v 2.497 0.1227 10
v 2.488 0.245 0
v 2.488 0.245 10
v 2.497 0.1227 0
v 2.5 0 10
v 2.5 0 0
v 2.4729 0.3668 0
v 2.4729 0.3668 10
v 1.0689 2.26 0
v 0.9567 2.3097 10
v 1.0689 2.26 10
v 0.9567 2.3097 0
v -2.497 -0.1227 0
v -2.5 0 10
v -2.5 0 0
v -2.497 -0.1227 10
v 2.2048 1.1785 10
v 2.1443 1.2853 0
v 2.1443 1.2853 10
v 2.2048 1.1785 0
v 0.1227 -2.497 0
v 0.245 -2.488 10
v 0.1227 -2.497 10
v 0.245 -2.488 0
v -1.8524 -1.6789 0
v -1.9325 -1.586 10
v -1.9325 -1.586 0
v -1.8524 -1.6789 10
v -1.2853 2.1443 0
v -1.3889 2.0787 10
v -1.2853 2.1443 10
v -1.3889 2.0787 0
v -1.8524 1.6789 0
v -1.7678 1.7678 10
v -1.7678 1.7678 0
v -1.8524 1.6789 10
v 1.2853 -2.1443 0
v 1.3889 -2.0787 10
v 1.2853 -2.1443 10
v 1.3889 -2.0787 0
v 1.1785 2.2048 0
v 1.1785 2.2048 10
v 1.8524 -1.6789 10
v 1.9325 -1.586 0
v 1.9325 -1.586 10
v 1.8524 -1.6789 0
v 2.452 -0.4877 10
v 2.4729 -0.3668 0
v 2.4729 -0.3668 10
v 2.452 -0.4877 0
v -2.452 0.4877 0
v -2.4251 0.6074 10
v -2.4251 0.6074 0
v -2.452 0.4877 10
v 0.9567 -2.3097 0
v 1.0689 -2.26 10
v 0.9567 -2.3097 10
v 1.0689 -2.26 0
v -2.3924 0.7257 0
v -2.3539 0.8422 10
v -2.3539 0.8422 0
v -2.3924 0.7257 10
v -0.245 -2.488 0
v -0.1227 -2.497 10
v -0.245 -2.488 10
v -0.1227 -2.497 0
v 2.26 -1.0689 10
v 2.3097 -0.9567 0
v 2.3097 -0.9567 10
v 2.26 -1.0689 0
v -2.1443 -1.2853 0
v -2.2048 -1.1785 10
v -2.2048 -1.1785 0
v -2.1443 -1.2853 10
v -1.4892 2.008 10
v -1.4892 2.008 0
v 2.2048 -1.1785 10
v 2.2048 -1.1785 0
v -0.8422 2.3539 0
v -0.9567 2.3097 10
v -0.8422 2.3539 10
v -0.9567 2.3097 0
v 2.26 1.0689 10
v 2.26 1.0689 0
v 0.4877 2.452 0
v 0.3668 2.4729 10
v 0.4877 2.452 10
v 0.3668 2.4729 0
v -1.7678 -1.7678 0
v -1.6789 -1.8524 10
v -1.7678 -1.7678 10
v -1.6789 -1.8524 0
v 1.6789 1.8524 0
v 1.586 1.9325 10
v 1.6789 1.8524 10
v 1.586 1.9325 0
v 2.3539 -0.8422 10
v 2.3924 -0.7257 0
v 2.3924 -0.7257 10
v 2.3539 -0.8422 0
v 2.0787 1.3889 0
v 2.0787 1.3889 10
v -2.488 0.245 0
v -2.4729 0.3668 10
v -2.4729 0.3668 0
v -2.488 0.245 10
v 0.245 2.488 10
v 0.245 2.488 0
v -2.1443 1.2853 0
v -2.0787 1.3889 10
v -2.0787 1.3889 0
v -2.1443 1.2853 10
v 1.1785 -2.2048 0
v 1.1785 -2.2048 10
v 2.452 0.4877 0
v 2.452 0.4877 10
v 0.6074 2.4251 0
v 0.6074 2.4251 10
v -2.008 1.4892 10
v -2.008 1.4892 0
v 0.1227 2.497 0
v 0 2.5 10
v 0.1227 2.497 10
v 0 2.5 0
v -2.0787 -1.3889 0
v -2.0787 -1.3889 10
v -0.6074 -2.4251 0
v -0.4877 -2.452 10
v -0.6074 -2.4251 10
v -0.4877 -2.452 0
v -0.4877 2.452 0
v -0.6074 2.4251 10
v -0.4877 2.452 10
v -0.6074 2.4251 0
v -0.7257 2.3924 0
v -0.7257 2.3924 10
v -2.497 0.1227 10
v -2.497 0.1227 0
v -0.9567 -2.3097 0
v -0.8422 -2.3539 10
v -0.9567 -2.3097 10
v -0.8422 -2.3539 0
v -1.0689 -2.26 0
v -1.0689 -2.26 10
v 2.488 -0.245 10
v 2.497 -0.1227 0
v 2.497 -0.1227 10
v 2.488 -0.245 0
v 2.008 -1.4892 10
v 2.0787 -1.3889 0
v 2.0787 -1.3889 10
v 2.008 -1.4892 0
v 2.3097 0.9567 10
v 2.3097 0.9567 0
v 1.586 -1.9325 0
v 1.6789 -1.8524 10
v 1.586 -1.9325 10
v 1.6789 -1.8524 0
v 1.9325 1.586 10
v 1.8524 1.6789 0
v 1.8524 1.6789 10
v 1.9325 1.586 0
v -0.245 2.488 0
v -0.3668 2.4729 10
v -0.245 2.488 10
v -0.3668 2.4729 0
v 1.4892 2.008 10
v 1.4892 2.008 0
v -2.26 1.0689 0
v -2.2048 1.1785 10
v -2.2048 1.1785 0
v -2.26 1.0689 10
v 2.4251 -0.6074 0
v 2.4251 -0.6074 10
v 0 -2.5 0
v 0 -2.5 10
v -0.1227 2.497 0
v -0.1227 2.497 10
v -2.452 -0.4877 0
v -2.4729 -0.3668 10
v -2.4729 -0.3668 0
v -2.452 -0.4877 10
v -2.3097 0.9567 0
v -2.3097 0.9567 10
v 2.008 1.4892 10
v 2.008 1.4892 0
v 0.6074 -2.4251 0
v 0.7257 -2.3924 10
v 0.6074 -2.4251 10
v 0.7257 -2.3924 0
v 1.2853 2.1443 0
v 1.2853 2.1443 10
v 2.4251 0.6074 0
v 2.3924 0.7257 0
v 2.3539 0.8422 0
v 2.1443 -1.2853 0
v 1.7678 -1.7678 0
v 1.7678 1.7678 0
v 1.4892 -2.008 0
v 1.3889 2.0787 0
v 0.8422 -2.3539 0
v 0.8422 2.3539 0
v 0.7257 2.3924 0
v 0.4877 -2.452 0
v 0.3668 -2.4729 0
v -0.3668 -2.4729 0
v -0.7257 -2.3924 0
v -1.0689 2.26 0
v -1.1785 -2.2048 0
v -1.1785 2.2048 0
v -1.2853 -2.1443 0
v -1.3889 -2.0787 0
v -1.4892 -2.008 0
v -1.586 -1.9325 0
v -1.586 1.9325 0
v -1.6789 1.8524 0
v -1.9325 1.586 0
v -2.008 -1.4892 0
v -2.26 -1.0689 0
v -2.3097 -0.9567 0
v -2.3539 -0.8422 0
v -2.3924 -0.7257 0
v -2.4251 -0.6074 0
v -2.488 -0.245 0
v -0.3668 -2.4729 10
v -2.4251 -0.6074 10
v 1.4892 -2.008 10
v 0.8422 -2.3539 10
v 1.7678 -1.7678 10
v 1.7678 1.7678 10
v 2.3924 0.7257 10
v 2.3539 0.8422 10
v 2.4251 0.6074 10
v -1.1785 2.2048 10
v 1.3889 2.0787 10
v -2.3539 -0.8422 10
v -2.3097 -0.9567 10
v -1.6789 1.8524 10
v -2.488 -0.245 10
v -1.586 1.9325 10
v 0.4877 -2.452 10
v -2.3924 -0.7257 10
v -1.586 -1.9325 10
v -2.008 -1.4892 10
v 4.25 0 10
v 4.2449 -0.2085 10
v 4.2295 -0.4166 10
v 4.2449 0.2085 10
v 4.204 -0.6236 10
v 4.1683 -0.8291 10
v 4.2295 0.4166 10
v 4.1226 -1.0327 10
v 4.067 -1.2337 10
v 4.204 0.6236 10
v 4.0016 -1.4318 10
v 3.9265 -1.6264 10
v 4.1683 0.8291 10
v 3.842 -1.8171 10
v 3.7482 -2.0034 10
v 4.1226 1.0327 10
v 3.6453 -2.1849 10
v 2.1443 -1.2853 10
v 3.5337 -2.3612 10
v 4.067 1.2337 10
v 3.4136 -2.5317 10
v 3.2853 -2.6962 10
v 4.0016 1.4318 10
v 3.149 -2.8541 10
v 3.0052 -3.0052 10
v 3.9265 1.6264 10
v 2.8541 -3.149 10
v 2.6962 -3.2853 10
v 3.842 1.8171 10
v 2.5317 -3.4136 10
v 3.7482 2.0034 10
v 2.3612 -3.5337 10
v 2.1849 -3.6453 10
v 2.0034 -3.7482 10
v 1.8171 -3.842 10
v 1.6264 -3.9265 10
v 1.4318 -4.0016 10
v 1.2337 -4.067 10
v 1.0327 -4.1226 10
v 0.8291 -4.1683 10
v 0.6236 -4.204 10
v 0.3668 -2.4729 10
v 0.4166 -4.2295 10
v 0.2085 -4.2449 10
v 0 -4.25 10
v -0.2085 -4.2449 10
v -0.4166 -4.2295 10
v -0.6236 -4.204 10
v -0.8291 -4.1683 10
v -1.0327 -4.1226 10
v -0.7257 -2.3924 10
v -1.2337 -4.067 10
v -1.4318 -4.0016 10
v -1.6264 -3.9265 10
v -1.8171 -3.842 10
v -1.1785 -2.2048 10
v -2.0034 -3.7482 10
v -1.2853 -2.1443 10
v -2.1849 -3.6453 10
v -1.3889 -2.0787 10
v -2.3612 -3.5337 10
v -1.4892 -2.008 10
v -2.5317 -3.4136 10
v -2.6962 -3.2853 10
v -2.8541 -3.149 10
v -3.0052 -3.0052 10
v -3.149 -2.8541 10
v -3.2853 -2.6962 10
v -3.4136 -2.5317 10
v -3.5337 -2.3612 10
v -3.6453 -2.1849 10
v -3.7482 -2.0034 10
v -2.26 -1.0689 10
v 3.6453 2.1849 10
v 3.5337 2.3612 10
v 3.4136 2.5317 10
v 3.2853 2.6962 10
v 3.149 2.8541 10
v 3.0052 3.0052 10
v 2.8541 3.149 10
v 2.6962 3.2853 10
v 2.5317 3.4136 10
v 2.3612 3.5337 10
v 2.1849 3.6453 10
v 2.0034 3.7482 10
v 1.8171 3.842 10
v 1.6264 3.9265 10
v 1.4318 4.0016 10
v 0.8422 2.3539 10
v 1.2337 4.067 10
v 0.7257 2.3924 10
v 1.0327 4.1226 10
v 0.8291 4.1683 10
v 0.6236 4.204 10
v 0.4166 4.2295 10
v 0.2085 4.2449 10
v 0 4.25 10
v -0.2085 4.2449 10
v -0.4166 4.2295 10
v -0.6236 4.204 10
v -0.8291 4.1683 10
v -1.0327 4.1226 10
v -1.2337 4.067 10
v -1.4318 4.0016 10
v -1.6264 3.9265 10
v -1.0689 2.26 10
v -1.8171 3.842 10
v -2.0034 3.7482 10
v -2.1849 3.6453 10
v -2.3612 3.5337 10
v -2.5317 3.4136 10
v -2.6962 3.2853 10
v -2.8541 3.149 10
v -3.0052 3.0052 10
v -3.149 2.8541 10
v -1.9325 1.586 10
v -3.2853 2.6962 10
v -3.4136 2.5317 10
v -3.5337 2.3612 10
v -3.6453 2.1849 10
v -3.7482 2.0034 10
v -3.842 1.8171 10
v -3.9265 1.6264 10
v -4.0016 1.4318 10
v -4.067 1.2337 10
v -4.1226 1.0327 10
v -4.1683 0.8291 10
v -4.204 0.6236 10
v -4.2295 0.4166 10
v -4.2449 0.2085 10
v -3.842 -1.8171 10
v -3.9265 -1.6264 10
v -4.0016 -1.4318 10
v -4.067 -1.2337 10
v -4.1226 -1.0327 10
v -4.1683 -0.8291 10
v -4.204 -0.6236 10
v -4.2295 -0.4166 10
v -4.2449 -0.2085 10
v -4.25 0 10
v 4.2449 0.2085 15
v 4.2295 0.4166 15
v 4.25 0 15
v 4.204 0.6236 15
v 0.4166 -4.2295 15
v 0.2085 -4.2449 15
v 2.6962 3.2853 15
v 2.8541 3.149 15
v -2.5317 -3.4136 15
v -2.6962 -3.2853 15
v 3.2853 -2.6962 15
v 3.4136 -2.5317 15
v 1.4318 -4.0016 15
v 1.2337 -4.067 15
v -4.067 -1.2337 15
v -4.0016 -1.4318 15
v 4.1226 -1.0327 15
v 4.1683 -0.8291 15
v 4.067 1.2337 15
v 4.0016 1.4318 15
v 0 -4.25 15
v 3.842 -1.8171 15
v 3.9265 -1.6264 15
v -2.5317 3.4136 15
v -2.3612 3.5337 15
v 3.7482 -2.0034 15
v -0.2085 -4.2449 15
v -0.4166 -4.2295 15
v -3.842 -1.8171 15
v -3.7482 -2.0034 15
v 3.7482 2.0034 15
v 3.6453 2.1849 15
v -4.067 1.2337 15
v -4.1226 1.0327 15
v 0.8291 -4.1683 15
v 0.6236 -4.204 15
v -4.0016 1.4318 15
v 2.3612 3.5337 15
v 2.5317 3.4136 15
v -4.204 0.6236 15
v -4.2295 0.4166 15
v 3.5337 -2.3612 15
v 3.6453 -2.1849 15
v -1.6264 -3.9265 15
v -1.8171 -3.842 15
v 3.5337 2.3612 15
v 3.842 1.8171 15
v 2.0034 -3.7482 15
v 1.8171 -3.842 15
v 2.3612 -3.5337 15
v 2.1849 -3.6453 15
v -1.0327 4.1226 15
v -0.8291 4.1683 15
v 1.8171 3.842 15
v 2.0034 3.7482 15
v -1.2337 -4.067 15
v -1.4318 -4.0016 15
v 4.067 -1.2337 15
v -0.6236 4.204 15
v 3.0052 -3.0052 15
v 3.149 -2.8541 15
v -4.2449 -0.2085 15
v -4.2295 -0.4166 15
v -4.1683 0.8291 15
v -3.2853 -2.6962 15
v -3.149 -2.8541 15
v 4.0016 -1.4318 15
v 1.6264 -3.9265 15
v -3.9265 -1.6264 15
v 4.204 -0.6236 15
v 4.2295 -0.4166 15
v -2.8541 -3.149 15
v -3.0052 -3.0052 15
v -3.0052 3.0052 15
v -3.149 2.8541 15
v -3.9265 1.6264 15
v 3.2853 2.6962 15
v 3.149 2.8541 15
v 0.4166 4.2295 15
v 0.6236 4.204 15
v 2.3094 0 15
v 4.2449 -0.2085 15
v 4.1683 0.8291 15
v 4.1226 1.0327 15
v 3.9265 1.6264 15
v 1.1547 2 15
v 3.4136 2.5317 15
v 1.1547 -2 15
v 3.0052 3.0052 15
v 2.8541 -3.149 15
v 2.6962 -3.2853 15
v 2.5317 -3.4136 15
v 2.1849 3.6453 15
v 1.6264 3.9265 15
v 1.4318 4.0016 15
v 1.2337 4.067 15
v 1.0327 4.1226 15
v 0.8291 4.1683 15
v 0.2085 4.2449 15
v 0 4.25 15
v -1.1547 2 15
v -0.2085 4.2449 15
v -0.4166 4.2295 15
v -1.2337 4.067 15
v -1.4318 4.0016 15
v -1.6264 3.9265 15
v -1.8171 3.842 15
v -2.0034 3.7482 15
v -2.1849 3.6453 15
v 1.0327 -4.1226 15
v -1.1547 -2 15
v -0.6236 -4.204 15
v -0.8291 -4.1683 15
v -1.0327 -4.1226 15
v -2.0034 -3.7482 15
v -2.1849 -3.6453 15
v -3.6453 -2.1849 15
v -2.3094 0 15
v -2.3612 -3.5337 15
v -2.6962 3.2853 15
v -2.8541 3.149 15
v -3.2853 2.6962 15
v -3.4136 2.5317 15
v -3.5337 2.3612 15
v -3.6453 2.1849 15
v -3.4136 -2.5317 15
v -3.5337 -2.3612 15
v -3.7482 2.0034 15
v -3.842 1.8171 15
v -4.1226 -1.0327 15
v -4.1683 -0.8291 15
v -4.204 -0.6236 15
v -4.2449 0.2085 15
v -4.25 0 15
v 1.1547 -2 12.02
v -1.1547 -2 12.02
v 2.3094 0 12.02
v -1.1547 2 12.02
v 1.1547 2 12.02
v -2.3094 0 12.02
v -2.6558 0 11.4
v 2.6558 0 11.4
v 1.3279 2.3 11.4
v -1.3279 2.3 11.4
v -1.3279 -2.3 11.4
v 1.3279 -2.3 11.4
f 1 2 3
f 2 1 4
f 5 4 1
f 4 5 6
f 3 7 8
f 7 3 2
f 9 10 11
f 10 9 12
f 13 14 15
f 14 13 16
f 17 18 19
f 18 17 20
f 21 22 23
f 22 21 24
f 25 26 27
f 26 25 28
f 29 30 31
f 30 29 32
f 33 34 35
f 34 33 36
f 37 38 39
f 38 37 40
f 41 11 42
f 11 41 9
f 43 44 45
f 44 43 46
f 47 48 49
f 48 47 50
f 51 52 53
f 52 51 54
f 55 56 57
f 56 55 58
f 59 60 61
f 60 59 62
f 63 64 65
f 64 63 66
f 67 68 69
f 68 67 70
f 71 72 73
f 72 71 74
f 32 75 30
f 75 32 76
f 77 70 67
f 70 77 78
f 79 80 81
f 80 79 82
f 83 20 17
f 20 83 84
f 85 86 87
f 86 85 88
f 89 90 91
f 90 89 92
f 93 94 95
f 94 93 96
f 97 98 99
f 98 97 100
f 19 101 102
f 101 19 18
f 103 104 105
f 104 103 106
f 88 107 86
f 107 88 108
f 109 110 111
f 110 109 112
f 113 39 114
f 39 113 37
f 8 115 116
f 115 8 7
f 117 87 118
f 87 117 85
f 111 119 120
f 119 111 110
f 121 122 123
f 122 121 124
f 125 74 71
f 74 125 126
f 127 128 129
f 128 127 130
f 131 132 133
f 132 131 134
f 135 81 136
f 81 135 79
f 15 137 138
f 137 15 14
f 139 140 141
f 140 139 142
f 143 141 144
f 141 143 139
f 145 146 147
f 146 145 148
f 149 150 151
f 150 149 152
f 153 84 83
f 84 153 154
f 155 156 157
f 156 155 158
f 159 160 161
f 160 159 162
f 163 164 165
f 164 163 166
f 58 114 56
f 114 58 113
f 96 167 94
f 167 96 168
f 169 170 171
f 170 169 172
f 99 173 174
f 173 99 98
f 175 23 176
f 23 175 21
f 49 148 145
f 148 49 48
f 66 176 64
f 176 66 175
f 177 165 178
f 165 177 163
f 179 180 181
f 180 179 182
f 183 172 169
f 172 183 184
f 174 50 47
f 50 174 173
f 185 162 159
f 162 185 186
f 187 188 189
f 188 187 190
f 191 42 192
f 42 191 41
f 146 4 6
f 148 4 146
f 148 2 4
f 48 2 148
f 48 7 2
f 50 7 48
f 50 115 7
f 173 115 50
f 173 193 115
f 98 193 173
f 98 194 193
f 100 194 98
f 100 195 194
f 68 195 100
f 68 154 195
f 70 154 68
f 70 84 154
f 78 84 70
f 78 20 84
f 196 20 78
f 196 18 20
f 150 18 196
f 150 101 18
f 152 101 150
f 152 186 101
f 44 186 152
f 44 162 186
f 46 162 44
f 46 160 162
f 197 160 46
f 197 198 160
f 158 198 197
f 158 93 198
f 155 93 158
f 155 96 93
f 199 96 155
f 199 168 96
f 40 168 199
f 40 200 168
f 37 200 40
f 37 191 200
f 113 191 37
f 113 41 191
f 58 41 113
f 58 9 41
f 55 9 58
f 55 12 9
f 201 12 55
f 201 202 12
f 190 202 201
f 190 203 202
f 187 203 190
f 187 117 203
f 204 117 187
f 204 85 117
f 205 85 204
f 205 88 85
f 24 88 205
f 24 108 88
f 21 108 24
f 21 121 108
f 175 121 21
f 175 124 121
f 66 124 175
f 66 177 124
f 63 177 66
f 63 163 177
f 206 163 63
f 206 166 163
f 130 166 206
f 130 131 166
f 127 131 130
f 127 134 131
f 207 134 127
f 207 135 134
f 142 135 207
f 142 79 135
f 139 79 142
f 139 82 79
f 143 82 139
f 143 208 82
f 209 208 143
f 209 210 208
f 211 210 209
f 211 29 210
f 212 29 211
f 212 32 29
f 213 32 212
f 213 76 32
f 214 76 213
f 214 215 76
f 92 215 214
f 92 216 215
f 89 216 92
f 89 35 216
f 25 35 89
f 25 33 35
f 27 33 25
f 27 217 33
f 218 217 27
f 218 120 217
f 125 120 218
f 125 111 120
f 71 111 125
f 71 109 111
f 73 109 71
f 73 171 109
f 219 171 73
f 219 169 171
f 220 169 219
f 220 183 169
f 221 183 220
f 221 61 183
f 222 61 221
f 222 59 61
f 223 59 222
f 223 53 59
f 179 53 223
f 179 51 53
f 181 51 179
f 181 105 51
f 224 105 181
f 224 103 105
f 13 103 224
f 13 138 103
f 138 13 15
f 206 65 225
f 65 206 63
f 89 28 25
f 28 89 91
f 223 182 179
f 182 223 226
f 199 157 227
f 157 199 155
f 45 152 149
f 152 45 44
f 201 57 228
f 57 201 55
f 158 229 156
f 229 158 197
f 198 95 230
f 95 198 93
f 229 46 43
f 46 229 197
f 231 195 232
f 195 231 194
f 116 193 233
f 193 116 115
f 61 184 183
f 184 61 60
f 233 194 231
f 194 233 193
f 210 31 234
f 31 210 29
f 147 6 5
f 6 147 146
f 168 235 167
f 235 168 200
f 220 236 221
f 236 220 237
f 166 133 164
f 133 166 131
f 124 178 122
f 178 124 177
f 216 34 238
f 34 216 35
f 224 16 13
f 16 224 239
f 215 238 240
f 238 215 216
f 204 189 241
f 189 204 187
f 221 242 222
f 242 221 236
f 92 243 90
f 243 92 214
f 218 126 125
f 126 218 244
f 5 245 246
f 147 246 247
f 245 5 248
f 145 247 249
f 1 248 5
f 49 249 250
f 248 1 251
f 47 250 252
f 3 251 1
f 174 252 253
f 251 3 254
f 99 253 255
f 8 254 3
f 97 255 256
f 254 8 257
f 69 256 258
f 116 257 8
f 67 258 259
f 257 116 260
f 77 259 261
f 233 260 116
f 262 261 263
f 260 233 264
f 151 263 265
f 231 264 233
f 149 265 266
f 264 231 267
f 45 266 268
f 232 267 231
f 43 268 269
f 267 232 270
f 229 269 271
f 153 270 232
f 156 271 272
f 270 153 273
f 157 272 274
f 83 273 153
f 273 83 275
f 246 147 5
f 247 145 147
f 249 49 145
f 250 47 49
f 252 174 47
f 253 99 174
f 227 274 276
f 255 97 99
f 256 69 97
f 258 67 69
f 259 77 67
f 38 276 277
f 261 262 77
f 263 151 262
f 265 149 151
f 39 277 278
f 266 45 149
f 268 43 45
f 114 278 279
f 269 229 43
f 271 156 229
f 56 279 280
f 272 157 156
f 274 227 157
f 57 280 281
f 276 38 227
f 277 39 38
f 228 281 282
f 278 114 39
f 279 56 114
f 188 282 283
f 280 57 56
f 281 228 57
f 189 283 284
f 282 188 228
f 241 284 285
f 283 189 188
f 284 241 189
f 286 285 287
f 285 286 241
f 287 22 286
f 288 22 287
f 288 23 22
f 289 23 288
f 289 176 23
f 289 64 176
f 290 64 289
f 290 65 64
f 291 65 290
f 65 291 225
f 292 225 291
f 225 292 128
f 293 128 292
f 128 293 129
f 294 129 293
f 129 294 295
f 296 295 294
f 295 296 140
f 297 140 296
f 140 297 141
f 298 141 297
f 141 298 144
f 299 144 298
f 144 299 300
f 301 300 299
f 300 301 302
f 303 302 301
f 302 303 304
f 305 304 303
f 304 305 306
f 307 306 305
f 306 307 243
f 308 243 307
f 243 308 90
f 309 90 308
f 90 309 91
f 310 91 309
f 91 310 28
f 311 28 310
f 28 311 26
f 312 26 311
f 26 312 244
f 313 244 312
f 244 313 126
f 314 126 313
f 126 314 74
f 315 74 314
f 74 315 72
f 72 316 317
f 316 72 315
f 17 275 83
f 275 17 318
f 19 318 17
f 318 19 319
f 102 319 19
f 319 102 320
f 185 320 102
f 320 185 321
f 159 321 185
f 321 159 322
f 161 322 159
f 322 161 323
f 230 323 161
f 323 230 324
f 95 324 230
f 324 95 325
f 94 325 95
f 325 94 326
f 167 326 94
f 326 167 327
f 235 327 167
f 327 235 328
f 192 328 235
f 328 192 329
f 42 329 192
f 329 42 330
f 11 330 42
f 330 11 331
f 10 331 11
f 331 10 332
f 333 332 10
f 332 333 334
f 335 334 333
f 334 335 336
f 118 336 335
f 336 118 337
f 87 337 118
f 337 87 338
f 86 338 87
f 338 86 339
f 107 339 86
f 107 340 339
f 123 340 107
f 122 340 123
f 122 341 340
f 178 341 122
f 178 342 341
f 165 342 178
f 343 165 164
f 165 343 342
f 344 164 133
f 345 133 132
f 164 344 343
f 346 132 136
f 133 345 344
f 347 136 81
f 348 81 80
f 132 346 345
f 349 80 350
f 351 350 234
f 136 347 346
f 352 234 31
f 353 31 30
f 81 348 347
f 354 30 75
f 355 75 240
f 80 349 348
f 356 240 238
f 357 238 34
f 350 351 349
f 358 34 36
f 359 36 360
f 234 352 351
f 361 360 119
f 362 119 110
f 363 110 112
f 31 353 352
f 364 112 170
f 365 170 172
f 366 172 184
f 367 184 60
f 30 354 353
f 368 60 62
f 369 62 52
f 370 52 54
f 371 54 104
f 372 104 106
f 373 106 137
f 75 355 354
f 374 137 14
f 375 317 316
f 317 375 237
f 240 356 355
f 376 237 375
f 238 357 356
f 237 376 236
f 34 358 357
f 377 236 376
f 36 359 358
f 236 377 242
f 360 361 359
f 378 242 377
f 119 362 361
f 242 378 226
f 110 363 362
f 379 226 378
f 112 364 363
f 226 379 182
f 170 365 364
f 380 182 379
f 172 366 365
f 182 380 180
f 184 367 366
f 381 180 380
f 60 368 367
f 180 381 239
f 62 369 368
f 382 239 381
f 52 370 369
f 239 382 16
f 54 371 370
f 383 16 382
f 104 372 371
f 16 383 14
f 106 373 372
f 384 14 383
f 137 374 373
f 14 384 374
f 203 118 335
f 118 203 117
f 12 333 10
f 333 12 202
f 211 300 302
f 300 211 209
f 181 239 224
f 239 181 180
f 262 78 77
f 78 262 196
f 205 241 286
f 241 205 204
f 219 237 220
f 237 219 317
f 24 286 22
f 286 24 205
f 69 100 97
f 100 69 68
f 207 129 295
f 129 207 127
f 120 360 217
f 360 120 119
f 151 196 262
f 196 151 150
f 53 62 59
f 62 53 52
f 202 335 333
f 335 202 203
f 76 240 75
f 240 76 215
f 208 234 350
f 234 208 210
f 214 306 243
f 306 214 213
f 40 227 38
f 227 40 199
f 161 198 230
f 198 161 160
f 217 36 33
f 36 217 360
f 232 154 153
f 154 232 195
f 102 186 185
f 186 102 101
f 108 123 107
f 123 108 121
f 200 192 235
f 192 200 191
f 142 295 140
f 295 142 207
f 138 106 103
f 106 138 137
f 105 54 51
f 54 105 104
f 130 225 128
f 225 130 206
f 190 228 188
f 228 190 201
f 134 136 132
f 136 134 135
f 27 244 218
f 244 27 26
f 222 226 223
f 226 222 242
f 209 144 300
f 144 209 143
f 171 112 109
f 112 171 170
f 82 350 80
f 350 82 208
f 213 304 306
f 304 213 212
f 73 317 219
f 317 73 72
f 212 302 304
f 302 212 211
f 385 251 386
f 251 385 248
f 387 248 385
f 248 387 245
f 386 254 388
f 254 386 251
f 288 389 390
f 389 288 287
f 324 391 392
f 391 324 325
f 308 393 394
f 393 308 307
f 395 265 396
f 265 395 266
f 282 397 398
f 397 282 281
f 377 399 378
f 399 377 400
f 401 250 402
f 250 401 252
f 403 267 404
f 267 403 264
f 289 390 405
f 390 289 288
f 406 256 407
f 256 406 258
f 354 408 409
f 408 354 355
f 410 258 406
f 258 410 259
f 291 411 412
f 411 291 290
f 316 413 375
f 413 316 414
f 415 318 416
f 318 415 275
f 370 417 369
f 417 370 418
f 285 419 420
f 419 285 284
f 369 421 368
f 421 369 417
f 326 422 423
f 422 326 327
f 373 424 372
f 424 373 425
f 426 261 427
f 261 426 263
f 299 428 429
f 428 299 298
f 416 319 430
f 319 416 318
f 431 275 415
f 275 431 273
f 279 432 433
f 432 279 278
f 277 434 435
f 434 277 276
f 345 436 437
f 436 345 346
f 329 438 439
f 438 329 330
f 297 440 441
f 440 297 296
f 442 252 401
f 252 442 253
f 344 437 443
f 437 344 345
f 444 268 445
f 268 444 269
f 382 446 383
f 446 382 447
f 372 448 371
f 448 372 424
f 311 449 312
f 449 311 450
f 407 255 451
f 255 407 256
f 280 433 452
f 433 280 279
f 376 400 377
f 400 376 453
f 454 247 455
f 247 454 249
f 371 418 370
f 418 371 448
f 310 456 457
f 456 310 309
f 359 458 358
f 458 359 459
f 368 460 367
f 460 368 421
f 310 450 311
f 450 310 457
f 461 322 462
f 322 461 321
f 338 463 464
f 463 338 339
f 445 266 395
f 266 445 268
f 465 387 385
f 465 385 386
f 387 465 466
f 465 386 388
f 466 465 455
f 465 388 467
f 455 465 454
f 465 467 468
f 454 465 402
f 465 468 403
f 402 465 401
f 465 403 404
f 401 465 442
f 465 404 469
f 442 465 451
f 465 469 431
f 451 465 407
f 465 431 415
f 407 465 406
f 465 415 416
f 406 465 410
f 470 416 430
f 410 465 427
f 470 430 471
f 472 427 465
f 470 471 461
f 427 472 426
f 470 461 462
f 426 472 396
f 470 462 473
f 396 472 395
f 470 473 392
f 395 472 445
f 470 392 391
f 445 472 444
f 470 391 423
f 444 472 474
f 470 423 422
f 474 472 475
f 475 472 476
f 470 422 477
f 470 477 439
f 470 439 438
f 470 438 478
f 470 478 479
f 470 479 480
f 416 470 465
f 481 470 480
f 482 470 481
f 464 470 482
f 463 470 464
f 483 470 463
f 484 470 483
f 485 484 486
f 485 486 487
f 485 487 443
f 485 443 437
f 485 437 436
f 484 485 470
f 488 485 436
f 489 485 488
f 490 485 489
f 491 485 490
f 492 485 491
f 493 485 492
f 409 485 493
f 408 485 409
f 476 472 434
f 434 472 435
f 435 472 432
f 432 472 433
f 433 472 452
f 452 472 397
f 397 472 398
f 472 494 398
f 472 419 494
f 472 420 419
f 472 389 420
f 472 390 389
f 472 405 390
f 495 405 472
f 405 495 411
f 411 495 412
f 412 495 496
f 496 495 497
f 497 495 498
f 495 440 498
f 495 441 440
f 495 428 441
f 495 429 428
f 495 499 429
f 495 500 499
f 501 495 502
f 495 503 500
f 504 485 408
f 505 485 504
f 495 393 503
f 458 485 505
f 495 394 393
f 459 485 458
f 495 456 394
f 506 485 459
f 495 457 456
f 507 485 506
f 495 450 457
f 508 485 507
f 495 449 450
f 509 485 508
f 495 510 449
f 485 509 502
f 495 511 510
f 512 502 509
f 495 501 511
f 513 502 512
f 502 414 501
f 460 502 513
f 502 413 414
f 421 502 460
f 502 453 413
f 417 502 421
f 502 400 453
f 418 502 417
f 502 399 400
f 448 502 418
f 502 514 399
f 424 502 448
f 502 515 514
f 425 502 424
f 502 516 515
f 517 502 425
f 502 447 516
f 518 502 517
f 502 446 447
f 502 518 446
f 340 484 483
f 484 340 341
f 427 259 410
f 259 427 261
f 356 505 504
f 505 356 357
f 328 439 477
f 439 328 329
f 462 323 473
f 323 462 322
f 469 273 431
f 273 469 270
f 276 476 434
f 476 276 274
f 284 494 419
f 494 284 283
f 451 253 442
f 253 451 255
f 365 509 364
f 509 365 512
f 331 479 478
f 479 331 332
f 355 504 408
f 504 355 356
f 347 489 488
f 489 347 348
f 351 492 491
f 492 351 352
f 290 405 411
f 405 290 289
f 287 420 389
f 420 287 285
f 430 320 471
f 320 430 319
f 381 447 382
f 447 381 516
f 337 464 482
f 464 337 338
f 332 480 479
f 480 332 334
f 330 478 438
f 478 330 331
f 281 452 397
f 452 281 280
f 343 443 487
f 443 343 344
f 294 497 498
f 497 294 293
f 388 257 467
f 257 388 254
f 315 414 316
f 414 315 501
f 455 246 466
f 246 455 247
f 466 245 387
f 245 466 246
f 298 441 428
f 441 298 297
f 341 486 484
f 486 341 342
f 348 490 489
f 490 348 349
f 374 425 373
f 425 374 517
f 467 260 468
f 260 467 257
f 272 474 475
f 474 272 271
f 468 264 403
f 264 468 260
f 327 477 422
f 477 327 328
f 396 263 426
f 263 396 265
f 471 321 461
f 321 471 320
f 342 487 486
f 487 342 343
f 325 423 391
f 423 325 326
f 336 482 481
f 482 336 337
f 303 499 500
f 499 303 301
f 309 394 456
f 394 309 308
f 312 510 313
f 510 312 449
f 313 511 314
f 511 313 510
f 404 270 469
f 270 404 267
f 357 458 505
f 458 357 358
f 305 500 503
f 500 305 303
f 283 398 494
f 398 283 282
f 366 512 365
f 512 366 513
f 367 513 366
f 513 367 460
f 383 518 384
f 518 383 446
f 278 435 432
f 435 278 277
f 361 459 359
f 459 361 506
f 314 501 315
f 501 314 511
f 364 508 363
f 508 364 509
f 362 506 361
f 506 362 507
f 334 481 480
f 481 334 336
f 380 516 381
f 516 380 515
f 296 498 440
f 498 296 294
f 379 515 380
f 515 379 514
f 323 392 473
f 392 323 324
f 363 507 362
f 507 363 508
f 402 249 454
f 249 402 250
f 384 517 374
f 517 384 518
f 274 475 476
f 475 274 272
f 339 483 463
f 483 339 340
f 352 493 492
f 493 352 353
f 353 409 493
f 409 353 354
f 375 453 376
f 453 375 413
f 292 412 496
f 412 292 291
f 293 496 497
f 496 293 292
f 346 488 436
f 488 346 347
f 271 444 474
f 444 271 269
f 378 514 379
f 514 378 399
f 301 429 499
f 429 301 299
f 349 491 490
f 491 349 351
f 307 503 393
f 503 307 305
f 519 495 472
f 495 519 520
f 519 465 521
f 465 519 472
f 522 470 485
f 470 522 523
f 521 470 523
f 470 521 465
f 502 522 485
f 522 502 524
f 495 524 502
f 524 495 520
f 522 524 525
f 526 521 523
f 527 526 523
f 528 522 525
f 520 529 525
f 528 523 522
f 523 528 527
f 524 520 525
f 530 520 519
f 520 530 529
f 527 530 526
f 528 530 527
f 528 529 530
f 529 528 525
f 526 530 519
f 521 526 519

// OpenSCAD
$fn = 128;

d_shaft = 5.0;
L = 10.0;

d_head = 8.5;
h_head = 5.0;

hex_flat = 4.0;          // approximate for M5 socket
hex_depth = 3.0;         // approximate socket depth
hex_chamfer = 0.6;       // slight lead-in chamfer

module hex_prism(flat, h) {
    // Regular hex with given across-flats dimension
    r = flat / sqrt(3); // circumradius
    cylinder(h=h, r=r, $fn=6);
}

module socket_head_cap_screw() {
    difference() {
        union() {
            // Shaft
            cylinder(h=L, d=d_shaft);

            // Head
            translate([0,0,L])
                cylinder(h=h_head, d=d_head);
        }

        // Hex socket cut
        translate([0,0,L + h_head - hex_depth])
            hex_prism(hex_flat, hex_depth + 0.02);

        // Lead-in chamfer for socket
        translate([0,0,L + h_head - hex_depth - hex_chamfer])
            cylinder(h=hex_chamfer + 0.02, r1=(hex_flat/sqrt(3))*1.15, r2=(hex_flat/sqrt(3)), $fn=6);
    }
}

socket_head_cap_screw();
